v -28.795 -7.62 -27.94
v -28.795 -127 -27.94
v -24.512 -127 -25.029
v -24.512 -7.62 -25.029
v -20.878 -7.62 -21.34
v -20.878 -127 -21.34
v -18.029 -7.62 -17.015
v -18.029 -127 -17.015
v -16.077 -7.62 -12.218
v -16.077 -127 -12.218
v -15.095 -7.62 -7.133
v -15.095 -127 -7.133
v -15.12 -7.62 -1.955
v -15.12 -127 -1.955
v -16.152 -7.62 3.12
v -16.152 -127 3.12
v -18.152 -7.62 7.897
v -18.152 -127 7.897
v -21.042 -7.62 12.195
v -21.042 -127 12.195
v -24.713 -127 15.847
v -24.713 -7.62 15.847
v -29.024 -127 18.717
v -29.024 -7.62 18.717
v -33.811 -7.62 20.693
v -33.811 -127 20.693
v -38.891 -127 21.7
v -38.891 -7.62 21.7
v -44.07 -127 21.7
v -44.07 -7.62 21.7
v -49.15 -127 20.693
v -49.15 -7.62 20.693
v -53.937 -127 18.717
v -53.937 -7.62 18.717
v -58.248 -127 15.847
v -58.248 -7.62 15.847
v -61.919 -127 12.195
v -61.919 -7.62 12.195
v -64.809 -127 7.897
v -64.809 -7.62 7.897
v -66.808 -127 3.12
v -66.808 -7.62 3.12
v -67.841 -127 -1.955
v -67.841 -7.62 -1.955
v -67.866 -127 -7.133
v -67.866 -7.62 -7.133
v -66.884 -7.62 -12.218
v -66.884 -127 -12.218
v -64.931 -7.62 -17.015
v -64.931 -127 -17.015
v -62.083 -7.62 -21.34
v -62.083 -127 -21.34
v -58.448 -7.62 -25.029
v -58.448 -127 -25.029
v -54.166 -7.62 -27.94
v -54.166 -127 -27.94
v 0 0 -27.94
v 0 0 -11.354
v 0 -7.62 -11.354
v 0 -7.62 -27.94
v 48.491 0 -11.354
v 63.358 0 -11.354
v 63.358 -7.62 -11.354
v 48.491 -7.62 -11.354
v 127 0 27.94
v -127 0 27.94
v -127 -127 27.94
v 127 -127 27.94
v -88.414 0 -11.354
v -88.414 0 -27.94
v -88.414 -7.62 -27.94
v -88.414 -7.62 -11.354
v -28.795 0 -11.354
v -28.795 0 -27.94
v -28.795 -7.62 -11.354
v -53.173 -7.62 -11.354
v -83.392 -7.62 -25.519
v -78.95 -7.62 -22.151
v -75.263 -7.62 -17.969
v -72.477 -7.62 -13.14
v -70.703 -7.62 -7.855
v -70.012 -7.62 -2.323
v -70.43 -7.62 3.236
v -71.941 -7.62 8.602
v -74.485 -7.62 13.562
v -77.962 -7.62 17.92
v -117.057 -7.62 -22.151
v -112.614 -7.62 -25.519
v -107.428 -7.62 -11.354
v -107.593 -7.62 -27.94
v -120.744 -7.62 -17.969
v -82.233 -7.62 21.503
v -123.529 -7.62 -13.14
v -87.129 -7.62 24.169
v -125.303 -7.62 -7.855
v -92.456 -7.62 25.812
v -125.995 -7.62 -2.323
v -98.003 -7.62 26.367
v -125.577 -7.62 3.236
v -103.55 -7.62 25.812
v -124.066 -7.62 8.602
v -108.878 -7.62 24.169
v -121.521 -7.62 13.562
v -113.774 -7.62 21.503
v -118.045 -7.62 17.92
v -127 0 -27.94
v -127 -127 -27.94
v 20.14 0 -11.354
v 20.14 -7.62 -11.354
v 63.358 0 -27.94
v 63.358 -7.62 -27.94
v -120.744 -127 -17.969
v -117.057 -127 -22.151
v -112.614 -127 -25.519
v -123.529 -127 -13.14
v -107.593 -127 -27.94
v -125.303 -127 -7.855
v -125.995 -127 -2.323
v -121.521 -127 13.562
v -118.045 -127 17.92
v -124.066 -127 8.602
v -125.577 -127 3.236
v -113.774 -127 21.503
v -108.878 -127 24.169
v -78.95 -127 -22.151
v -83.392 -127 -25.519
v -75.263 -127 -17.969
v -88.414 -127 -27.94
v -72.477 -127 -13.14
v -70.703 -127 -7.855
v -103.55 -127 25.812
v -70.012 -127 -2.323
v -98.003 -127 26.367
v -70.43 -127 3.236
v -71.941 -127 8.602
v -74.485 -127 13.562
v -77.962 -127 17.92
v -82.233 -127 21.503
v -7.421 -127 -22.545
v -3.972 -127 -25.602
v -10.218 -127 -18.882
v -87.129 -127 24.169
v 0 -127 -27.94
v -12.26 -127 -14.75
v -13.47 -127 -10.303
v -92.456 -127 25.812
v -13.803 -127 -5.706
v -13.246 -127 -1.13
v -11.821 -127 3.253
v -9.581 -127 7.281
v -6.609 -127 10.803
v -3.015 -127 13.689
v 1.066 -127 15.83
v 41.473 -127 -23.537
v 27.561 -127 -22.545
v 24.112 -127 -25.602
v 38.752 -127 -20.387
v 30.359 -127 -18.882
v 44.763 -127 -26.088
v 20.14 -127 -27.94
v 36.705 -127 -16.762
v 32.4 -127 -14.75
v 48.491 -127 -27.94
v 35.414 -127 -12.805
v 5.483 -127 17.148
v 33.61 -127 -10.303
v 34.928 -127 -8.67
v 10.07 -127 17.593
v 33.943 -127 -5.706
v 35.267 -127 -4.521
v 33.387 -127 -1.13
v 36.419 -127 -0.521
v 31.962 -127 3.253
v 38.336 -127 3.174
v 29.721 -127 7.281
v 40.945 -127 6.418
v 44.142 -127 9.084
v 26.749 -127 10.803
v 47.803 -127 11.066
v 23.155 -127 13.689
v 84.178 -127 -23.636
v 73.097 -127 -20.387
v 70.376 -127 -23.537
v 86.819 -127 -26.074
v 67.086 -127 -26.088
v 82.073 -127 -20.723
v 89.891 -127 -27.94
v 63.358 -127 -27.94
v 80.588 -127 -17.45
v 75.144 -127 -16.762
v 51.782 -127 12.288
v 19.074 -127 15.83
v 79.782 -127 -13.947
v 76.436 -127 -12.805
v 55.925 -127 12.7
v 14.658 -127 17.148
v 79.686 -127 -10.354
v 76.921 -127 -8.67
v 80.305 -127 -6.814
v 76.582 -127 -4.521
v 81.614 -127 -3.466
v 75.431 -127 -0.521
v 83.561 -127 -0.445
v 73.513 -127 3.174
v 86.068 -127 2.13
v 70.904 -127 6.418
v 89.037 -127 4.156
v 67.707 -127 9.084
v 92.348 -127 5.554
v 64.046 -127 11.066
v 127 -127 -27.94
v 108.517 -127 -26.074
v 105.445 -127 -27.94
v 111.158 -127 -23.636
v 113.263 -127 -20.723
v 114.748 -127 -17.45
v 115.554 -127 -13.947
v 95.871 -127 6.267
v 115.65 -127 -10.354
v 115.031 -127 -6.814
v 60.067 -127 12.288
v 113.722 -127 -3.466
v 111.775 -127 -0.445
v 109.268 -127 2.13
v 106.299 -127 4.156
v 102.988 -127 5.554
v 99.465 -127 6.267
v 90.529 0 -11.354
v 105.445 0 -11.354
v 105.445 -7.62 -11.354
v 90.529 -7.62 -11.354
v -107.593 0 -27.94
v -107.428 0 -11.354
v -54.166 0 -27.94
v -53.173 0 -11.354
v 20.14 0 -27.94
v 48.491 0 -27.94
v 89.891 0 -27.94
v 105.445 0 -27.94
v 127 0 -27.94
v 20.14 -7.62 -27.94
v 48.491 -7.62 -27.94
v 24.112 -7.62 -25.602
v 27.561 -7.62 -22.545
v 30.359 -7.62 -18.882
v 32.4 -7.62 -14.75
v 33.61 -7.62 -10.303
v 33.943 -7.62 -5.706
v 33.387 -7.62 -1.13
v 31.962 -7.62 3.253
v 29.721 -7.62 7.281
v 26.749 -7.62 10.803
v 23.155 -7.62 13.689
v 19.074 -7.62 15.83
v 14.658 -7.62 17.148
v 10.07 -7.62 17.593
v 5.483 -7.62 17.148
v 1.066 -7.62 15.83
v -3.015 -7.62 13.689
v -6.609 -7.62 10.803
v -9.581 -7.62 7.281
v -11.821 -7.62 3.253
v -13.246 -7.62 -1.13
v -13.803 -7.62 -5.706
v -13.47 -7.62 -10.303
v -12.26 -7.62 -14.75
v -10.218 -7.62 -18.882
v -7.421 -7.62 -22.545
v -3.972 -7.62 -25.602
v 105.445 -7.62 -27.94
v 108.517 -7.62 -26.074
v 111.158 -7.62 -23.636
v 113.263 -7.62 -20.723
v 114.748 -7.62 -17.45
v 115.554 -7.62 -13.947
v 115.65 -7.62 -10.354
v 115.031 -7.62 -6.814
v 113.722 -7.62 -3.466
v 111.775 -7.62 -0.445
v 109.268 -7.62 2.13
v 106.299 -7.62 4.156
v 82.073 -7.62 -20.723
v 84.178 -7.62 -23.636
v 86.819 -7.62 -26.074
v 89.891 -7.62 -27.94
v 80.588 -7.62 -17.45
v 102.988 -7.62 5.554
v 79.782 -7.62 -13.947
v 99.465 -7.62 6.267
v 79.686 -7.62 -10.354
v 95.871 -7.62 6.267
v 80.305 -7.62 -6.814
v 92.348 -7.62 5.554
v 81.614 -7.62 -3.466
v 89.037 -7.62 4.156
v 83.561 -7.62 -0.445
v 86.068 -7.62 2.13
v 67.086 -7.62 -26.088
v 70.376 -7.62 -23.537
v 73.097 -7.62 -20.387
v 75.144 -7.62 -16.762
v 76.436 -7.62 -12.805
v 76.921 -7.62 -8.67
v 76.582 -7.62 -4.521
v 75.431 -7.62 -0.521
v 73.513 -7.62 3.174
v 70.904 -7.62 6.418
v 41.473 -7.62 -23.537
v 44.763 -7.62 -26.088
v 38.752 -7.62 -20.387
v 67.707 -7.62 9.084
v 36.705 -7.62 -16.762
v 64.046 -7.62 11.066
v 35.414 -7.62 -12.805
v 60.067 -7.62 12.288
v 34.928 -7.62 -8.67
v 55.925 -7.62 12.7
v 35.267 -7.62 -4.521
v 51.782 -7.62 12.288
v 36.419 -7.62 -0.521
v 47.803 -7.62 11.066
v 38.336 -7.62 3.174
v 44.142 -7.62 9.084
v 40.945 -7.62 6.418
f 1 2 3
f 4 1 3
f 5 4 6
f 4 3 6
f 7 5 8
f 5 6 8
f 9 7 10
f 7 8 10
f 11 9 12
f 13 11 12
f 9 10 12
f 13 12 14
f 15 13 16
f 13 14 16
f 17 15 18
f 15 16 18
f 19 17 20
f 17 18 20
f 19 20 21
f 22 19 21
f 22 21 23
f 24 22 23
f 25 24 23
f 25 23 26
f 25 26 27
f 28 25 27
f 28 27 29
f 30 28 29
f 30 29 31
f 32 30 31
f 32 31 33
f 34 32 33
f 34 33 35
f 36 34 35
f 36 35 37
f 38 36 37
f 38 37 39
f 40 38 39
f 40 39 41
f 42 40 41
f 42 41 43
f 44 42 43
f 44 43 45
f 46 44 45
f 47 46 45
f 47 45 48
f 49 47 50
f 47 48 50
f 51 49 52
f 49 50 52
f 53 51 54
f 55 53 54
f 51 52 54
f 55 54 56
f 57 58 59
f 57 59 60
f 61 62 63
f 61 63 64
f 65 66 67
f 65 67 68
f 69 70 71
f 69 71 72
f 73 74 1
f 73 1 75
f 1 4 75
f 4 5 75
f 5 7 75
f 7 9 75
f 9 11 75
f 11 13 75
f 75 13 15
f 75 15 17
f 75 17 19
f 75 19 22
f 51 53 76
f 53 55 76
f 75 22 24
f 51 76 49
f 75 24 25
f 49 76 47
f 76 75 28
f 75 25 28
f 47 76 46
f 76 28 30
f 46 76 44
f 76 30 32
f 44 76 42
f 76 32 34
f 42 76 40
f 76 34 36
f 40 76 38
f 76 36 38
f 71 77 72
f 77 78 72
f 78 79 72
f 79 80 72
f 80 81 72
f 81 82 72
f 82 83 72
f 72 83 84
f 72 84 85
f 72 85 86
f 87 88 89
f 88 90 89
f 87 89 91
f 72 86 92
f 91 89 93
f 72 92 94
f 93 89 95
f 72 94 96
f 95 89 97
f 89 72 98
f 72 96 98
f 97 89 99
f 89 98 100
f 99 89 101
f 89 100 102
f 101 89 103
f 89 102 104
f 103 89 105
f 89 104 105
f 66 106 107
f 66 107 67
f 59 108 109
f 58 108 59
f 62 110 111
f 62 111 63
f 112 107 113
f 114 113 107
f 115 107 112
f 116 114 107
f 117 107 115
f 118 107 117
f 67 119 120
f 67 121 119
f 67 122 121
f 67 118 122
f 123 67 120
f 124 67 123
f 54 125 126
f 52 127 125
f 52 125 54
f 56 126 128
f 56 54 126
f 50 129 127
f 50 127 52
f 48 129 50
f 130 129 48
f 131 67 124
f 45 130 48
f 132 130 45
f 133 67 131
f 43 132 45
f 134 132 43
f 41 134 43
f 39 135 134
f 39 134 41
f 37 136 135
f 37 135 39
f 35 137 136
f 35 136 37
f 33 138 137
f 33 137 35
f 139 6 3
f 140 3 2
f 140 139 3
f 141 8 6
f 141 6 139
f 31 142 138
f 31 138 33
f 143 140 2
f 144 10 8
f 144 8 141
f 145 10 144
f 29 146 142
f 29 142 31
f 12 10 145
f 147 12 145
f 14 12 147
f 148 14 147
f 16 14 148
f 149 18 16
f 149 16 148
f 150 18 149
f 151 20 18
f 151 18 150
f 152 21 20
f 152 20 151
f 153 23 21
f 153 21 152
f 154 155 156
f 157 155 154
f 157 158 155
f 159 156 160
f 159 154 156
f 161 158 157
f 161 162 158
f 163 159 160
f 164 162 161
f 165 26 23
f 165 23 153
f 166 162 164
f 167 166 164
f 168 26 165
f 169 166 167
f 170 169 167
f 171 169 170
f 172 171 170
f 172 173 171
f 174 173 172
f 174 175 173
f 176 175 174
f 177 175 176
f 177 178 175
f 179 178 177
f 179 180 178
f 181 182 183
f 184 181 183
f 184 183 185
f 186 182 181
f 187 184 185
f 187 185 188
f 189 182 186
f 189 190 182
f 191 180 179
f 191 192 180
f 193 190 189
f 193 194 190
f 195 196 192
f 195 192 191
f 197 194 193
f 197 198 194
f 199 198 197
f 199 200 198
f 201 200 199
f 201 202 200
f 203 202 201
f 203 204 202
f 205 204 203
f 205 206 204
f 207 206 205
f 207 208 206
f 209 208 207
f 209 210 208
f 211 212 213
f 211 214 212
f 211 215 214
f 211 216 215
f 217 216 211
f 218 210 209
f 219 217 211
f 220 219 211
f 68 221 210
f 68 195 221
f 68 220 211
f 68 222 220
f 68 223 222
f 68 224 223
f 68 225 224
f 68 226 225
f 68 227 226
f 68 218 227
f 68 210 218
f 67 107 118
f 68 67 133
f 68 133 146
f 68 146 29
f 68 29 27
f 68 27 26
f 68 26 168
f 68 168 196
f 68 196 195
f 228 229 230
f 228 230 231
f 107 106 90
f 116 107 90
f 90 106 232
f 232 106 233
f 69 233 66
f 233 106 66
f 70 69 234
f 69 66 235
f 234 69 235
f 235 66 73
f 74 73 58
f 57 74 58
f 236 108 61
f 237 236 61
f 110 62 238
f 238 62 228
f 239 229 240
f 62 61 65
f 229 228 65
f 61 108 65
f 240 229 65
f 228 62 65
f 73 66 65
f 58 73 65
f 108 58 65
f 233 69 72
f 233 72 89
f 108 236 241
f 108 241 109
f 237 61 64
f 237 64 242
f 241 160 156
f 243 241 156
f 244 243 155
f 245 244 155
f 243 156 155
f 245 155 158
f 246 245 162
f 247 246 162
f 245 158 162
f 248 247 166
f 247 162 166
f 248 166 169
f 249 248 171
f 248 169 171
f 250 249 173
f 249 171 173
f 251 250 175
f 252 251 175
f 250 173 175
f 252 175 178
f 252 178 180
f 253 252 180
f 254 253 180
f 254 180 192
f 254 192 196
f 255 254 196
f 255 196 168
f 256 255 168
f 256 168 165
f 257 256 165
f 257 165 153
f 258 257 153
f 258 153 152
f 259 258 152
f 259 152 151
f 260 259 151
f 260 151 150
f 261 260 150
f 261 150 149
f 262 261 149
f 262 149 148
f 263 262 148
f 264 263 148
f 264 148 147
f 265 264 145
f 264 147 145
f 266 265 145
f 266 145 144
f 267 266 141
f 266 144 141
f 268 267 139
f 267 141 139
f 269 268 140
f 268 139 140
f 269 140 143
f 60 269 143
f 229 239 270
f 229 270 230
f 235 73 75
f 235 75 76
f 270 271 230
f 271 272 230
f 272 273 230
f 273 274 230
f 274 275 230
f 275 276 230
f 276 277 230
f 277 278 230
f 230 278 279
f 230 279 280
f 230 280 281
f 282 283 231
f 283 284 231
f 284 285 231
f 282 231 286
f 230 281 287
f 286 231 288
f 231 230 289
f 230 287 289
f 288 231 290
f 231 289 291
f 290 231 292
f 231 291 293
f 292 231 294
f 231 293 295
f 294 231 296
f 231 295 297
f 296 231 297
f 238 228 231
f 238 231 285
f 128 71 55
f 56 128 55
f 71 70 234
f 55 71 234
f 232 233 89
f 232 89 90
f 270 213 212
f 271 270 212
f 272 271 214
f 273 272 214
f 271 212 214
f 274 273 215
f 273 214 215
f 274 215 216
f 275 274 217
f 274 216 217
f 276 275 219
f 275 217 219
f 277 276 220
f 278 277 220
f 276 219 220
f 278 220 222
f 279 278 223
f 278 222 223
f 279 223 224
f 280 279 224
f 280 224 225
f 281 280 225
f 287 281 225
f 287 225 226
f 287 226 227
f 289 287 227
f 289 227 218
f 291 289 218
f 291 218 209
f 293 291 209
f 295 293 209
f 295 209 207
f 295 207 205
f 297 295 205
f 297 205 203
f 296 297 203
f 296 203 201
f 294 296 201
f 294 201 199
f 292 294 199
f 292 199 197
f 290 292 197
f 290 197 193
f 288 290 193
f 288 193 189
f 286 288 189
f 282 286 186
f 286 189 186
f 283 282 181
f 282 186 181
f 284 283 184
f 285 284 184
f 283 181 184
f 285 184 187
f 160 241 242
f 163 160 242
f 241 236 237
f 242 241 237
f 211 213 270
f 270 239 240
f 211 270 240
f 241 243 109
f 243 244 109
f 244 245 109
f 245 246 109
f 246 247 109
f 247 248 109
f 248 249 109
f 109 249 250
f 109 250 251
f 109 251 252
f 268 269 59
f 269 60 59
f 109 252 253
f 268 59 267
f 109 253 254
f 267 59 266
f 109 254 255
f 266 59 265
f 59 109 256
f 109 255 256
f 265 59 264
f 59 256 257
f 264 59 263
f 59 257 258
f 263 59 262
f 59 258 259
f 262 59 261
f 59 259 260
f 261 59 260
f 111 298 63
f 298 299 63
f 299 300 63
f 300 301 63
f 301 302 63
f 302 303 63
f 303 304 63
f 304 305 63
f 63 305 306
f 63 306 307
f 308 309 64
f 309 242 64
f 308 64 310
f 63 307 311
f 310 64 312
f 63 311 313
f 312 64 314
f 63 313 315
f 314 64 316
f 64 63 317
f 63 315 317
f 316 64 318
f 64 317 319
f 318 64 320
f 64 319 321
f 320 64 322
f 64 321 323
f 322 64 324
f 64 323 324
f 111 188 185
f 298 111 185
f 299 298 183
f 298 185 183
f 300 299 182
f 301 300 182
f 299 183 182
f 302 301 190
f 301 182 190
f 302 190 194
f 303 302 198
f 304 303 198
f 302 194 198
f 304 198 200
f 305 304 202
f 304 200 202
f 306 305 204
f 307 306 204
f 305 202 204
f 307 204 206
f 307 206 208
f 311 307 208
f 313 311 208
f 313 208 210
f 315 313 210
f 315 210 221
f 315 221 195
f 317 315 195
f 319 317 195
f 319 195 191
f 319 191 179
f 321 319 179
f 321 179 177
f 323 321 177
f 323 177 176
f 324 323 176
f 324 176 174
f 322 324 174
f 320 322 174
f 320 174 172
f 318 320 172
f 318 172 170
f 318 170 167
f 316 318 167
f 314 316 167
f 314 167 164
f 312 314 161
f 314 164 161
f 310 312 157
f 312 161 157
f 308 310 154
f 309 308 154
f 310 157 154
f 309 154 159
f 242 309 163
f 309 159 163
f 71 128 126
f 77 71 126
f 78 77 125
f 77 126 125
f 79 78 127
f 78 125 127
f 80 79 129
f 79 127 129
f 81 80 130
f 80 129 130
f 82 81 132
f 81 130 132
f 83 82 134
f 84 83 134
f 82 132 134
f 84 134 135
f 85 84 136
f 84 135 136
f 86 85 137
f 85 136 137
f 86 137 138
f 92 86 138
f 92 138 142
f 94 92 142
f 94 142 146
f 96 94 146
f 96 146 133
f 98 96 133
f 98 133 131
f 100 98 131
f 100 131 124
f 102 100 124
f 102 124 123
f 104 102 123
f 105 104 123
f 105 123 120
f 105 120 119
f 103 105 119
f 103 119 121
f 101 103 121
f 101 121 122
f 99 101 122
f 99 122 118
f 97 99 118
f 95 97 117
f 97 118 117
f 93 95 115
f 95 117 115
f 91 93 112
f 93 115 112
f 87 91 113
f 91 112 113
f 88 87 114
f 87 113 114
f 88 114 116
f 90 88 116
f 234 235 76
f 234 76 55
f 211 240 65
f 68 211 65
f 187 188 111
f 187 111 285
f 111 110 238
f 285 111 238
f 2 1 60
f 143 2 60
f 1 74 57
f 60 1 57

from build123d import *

# Parameters (mm, degrees)
F0_W      = 254
F0_H      = 55.88
F1_DEPTH  = 127
F7_DEPTH  = 251.46
F8_DEPTH  = 251.46
F9_DEPTH  = 251.46
F10_DEPTH = 251.46
F11_DEPTH = 251.46
F12_W     = 18.410387516
F12_H     = 1.8
F12_W_2   = 28.7952162325
F12_W_3   = 28.3505693078
F12_W_4   = 10.2531584787
F13_DEPTH = 28.702
F14_W     = 21.5115528554
F14_H     = 27.94
F14_W_2   = 16.9484987855
F15_DEPTH = 76.2
F17_DEPTH = 7.62


with BuildPart() as f1:
    # F0 (on Front) → F1 (new body)
    with BuildSketch(Plane.XZ):
        Rectangle(F0_W, F0_H)
    extrude(amount=F1_DEPTH)

    # F6 (on face) → F7 (cut)
    with BuildSketch(Plane.XZ.offset(127)):
        with BuildLine():
            ThreePointArc((105.444855988, -27.94), (97.6680144668, 6.3565803399), (89.8911729455, -27.94))
            Line((89.8911729455, -27.94), (105.444855988, -27.94))
        make_face()
    extrude(amount=-F7_DEPTH, mode=Mode.SUBTRACT)

    # F5 (on face) → F8 (cut)
    with BuildSketch(Plane.XZ.offset(127)):
        with BuildLine():
            ThreePointArc((63.3584037423, -27.94), (55.9246577322, 12.700250005), (48.4909117222, -27.94))
            Line((48.4909117222, -27.94), (63.3584037423, -27.94))
        make_face()
    extrude(amount=-F8_DEPTH, mode=Mode.SUBTRACT)

    # F4 (on face) → F9 (cut)
    with BuildSketch(Plane.XZ.offset(127)):
        with BuildLine():
            ThreePointArc((20.1403424144, -27.94), (10.0701712072, 17.5928532036), (0, -27.94))
            Line((0, -27.94), (20.1403424144, -27.94))
        make_face()
    extrude(amount=-F9_DEPTH, mode=Mode.SUBTRACT)

    # F3 (on face) → F10 (cut)
    with BuildSketch(Plane.XZ.offset(127)):
        with BuildLine():
            ThreePointArc((-28.7952162325, -27.94), (-41.4804015309, 21.8266300514), (-54.1655868292, -27.94))
            Line((-54.1655868292, -27.94), (-28.7952162325, -27.94))
        make_face()
    extrude(amount=-F10_DEPTH, mode=Mode.SUBTRACT)

    # F2 (on face) → F11 (cut)
    with BuildSketch(Plane.XZ.offset(127)):
        with BuildLine():
            Line((-107.5928583741, -27.94), (-88.4136334062, -27.94))
            ThreePointArc((-88.4136334062, -27.94), (-98.0032458901, 26.3666404622), (-107.5928583741, -27.94))
        make_face()
    extrude(amount=-F11_DEPTH, mode=Mode.SUBTRACT)

    # F12 (on face) → F13 (cut)
    with BuildSketch(Plane(origin=(0, 0, -27.94), x_dir=(1, 0, 0), z_dir=(0, 0, -1))):
        with Locations((-116.7980521321, 3.44)):
            Rectangle(F12_W, F12_H)
        Polygon((-70.0032458901, 4.34), (-88.4136334062, 4.34), (-88.4136334062, 2.54), (-70.0032458901, 2.54), (-54.1655868292, 2.54), (-54.1655868292, 4.34), align=None)
        with Locations((-14.3976081163, 3.44)):
            Rectangle(F12_W_2, F12_H)
        with Locations((34.3156270683, 3.44)):
            Rectangle(F12_W_3, F12_H)
        Polygon((89.8911729455, 4.34), (63.3584037423, 4.34), (63.3584037423, 2.54), (79.6380144668, 2.54), (89.8911729455, 2.54), align=None)
        with Locations((110.5714352274, 3.44)):
            Rectangle(F12_W_4, F12_H)
    extrude(amount=-F13_DEPTH, mode=Mode.SUBTRACT)

    # F14 (on face) → F15 (cut)
    with BuildSketch(Plane(origin=(0, 0, 0), x_dir=(-1, 0, 0), z_dir=(0, 1, 0))):
        Polygon((-91.1045372486, -21.9016313345), (-104.6037971973, -25.1468683294), (-104.6037971973, -27.94), (-91.1045372486, -27.94), align=None)
        Polygon((-104.6037971973, 0), (-104.6037971973, -25.1468683294), (-91.1045372486, -21.9016313345), (-91.1045372486, 0), align=None)
        with BuildLine():
            Line((-48.8363243639, -11.7403062927), (-63.663393259, -15.3047500242))
            Line((-63.663393259, -15.3047500242), (-63.663393259, -27.8218393414))
            ThreePointArc((-63.663393259, -27.8218393414), (-63.5111285509, -27.8815134631), (-63.3584037423, -27.94))
            Line((-63.3584037423, -27.94), (-48.8363243639, -27.94))
            Line((-48.8363243639, -27.94), (-48.8363243639, -11.7403062927))
        make_face()
        Polygon((-63.663393259, 0), (-63.663393259, -15.3047500242), (-48.8363243639, -11.7403062927), (-48.8363243639, 0), align=None)
        with BuildLine():
            ThreePointArc((-81.4663434771, -19.5845989112), (-101.8823771095, 5.857126467), (-108.5034271854, -26.0843436838))
            Line((-108.5034271854, -26.0843436838), (-104.6037971973, -25.1468683294))
            Line((-104.6037971973, -25.1468683294), (-104.6037971973, 0))
            Line((-104.6037971973, 0), (-91.1045372486, 0))
            Line((-91.1045372486, 0), (-91.1045372486, -21.9016313345))
            Line((-91.1045372486, -21.9016313345), (-81.4663434771, -19.5845989112))
        make_face()
        with Locations((40.9021200612, -13.97)):
            Rectangle(F14_W, F14_H)
        with Locations((99.0267731249, -13.97)):
            Rectangle(F14_W_2, F14_H)
    extrude(amount=-F15_DEPTH, mode=Mode.SUBTRACT)

    # F16 (on face) → F17 (join)
    with BuildSketch(Plane(origin=(0, 0, 0), x_dir=(-1, 0, 0), z_dir=(0, 1, 0))):
        Polygon((127, 27.94), (-127, 27.94), (-127, -27.94), (-105.444855988, -27.94), (-105.444855988, -11.3536855206), (-90.5294641852, -11.3536855206), (-89.8911729455, -27.94), (-63.3584037423, -27.94), (-63.3584037423, -11.3536855206), (-48.4909117222, -11.3536855206), (-48.4909117222, -27.94), (-20.1403424144, -27.94), (-20.1403424144, -11.3536855206), (0, -11.3536855206), (0, -27.94), (28.7952162325, -27.94), (28.7952162325, -11.3536855206), (53.1729161739, -11.3536855206), (54.1655868292, -27.94), (88.4136334062, -27.94), (88.4136334062, -11.3536855206), (107.4278950691, -11.3536855206), (107.5928583741, -27.94), (127, -27.94), align=None)
    extrude(amount=-F17_DEPTH)


solid = f1.part
